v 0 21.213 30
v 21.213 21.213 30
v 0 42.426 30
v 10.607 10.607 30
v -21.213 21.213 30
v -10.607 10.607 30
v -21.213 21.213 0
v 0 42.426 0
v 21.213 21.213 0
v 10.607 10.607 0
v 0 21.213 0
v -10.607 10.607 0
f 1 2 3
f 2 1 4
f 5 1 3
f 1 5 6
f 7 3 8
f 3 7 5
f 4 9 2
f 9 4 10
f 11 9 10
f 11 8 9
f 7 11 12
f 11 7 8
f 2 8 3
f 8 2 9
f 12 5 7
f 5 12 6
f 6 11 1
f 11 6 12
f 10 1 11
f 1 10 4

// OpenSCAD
rotate([0,-90,0]){
    difference(){
        rotate([-45,0,0]) {
            cube([30, 30, 30]);
        }
        scale([1,0.5,0.5]) {
            rotate([-45,0,0]) {
                cube([30, 30, 30]);
            }
        }
    }
}
